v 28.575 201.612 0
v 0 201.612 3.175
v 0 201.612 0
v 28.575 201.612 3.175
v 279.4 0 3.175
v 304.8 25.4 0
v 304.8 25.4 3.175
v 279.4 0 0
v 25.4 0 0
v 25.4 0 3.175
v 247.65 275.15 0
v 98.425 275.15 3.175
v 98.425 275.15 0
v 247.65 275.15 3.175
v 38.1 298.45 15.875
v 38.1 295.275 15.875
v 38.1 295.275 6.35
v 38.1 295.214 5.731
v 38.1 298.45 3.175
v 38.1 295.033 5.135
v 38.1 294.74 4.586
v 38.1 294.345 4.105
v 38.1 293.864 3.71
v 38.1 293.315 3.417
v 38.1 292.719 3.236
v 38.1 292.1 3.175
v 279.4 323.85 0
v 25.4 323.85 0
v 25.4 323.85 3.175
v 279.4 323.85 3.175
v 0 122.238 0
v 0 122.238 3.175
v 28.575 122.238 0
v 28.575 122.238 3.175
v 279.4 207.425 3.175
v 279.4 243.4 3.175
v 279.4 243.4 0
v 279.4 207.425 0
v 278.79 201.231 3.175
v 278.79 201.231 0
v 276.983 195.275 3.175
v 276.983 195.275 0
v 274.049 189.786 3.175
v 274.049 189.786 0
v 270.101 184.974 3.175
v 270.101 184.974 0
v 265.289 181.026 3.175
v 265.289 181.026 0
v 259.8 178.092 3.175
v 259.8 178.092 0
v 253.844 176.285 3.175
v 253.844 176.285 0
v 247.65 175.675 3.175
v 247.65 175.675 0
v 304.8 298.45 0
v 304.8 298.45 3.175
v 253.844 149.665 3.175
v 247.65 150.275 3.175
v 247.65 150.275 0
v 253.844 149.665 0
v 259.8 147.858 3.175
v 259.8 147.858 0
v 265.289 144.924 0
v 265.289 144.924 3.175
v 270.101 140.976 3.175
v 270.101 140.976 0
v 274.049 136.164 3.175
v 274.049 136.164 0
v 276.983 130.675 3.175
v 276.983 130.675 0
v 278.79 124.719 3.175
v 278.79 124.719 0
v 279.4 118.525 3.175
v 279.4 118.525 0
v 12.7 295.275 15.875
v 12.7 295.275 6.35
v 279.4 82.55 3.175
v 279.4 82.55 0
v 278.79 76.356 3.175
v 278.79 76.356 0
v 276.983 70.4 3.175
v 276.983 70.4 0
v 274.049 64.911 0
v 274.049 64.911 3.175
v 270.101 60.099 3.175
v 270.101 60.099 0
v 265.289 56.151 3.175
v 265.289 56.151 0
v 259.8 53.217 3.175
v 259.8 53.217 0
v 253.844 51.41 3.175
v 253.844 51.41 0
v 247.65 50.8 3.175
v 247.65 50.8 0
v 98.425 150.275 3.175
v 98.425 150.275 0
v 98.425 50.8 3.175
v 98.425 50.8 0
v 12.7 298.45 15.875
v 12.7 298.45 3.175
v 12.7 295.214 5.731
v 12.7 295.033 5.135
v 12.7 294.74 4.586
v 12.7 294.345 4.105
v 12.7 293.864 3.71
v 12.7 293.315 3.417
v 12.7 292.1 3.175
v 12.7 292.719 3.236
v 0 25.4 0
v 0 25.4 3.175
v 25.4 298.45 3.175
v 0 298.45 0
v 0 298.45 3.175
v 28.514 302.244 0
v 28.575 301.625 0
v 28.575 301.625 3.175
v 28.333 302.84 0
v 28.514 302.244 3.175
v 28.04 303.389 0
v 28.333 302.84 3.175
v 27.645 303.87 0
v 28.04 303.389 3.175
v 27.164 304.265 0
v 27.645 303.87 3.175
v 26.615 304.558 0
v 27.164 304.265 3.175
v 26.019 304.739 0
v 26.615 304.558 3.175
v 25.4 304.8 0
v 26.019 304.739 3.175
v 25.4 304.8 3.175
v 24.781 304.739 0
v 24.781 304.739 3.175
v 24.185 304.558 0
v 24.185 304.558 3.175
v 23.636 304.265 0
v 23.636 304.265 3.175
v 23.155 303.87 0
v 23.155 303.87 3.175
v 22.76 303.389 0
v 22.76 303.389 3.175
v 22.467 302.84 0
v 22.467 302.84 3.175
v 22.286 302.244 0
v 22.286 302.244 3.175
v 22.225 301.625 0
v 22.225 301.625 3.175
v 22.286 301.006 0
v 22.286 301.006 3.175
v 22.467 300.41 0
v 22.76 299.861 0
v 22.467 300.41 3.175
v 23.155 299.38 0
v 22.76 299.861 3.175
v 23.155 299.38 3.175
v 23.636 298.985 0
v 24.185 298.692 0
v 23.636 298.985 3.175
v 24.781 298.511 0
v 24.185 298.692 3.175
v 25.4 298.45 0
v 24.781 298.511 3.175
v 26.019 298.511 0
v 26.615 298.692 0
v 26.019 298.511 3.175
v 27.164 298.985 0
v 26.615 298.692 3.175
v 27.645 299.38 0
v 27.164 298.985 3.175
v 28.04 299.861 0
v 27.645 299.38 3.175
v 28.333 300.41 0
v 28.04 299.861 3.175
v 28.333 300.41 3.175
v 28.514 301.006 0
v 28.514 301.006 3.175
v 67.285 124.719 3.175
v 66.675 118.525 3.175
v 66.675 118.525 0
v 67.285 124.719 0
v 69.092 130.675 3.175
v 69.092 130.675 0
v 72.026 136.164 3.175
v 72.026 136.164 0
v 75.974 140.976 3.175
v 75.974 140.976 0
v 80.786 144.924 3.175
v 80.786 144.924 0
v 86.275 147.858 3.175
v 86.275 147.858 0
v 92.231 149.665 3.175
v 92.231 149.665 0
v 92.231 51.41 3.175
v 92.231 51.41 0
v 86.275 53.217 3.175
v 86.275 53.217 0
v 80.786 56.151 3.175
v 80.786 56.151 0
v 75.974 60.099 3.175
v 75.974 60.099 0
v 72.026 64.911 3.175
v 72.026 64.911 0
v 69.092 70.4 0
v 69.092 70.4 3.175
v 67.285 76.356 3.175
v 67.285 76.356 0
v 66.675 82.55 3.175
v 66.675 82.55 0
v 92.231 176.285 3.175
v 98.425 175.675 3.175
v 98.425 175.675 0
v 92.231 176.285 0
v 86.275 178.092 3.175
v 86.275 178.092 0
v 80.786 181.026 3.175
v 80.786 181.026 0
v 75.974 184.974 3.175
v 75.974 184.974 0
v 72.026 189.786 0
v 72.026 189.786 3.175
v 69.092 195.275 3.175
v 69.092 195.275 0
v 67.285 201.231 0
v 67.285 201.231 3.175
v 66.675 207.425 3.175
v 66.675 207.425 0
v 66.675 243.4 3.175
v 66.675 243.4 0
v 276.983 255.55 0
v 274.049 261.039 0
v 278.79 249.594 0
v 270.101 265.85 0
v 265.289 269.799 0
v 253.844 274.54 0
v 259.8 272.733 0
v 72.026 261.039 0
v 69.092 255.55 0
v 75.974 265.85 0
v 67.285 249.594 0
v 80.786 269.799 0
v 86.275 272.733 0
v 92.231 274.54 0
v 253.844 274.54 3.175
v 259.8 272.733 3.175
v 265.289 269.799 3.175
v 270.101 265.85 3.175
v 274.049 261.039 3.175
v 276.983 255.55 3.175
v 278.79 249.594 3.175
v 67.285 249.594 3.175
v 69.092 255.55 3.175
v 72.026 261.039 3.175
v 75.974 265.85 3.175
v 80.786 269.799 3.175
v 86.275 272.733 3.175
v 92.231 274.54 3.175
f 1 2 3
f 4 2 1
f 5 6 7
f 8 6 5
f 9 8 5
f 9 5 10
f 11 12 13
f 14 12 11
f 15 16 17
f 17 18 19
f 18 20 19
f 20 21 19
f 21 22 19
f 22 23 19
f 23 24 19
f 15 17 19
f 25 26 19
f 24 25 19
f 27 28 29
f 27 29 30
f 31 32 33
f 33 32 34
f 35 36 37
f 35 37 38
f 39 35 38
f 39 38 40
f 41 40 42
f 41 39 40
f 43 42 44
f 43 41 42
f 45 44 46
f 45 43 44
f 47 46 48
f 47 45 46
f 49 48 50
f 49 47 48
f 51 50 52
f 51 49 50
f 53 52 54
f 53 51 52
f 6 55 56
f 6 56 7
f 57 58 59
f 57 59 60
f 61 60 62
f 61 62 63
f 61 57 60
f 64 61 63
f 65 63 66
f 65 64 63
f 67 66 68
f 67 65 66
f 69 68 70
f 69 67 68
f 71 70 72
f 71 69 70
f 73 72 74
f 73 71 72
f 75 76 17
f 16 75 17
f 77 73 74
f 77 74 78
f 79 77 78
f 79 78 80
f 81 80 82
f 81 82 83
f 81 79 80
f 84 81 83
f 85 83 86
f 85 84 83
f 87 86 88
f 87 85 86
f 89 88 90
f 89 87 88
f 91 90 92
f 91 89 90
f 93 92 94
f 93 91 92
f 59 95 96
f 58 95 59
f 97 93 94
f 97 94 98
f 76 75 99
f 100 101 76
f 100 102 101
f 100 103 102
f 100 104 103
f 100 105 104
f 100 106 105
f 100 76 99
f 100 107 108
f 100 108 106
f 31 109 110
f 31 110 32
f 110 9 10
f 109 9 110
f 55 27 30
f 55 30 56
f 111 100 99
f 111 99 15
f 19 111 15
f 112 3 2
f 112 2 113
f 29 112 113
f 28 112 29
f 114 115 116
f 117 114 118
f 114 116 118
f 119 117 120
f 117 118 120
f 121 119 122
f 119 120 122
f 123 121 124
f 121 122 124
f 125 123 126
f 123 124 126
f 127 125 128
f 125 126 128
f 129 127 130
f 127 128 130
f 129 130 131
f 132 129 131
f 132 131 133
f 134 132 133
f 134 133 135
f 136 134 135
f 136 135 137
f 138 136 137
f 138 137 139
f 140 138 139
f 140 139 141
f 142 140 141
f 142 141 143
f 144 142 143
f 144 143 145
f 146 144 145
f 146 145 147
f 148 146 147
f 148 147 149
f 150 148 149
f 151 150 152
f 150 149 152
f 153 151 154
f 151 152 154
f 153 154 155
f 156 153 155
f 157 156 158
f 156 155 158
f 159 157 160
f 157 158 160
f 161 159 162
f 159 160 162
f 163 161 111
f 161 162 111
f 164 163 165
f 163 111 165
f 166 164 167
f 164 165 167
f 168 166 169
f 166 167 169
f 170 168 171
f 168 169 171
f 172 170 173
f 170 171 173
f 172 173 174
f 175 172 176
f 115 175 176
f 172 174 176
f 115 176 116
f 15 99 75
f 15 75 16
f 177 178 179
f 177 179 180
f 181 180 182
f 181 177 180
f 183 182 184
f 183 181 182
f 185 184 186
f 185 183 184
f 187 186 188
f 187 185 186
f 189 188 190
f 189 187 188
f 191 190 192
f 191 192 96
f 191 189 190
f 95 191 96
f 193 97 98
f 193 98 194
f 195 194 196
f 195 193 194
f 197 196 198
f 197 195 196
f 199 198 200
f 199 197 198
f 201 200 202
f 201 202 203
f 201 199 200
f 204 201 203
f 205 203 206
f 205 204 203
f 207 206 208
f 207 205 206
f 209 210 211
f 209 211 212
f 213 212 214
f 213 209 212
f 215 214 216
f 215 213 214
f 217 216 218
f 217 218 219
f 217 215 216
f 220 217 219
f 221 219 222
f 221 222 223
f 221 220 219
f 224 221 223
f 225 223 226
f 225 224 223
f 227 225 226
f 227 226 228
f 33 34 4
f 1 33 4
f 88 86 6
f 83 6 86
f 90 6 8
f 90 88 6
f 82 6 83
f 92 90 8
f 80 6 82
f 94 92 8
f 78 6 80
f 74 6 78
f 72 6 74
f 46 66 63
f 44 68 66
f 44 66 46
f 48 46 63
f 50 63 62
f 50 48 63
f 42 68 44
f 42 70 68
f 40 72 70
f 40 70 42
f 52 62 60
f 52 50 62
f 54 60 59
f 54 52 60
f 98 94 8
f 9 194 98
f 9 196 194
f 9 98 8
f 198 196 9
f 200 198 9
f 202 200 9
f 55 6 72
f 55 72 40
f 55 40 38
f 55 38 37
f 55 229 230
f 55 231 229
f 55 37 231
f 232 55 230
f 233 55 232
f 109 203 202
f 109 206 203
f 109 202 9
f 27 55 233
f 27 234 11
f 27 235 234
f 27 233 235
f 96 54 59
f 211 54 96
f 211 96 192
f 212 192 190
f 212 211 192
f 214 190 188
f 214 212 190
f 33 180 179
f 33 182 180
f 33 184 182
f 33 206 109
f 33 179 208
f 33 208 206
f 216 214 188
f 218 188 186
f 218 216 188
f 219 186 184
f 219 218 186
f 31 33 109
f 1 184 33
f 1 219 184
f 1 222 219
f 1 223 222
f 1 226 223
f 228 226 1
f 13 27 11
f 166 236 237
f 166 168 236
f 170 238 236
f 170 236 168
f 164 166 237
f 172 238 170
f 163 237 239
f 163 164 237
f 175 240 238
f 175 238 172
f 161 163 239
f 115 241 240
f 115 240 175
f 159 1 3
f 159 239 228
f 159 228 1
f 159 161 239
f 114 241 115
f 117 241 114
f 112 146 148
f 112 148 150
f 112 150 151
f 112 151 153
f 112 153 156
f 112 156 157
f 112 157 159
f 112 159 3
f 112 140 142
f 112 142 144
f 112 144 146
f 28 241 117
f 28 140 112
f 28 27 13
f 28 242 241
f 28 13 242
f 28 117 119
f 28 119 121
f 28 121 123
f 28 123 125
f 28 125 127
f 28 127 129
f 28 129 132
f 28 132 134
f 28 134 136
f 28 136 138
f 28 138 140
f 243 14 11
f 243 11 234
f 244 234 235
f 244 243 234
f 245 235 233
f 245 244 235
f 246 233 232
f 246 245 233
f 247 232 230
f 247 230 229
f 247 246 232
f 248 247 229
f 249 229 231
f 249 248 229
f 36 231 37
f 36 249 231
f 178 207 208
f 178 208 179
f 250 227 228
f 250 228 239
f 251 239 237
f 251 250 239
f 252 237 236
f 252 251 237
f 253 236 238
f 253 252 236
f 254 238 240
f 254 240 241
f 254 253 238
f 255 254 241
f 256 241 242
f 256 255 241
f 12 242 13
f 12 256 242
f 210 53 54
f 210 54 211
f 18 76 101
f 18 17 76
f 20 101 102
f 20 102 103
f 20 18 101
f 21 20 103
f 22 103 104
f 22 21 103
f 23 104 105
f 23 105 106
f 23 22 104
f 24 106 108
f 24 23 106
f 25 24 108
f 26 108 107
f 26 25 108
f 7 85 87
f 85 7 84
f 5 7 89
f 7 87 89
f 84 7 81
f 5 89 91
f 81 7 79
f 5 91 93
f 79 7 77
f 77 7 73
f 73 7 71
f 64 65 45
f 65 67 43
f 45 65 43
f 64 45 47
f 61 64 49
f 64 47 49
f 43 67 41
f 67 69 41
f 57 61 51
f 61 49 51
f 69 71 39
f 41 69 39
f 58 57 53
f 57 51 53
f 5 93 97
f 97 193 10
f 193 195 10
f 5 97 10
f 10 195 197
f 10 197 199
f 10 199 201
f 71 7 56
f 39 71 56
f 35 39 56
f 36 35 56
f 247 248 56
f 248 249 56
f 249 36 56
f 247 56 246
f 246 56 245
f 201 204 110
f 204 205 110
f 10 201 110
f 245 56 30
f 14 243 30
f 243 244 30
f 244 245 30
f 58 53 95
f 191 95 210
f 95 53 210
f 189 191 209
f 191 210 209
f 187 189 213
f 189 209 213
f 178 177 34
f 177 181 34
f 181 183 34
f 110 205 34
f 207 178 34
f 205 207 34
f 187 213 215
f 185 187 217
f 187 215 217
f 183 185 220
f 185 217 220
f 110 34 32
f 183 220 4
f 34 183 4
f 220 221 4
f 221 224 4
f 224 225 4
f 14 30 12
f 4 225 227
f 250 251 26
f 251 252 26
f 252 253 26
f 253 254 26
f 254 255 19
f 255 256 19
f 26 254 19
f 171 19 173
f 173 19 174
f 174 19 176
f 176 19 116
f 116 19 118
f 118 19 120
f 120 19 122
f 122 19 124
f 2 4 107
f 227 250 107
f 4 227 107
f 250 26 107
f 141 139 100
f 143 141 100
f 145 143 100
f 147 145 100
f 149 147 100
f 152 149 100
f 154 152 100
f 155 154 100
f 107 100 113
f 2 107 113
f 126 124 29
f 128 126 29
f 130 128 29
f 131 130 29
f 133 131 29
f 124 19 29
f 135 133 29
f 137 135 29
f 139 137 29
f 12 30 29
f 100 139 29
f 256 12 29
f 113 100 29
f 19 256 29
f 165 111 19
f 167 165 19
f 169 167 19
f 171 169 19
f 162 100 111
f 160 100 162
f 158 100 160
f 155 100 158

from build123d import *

# Parameters (mm, degrees)
BOSS_EXTRUDE2_DEPTH = 3.175
SKETCH4_W           = 28.575
SKETCH4_H           = 79.375
CUT_EXTRUDE2_DEPTH  = 3.175
CUT_EXTRUDE3_DEPTH  = 3.175
SKETCH9_R           = 3.175
CUT_EXTRUDE4_DEPTH  = 3.175
SKETCH11_W          = 25.4
SKETCH11_H          = 3.175
BOSS_EXTRUDE3_DEPTH = 12.7
FILLET2_R           = 3.175


with BuildPart() as part:
    # Sketch1 → Boss-Extrude2 (new body)
    with BuildSketch(Plane.XY):
        Polygon((0, 298.45), (25.4, 323.85), (279.4, 323.85), (304.8, 298.45), (304.8, 25.4), (279.4, 0), (25.4, 0), (0, 25.4), align=None)
    extrude(amount=BOSS_EXTRUDE2_DEPTH)

    # Sketch4 → Cut-Extrude2 (cut)
    with BuildSketch(Plane.XY.offset(3.175)):
        with Locations((14.2875, 161.925)):
            Rectangle(SKETCH4_W, SKETCH4_H)
    extrude(amount=-CUT_EXTRUDE2_DEPTH, mode=Mode.SUBTRACT)

    # Sketch5 → Cut-Extrude3 (cut)
    with BuildSketch(Plane.XY.offset(3.175)):
        with BuildLine():
            Line((98.425, 275.149783319), (247.65, 275.149783319))
            ThreePointArc((247.65, 275.149783319), (270.100640303, 265.850423621), (279.4, 243.399783319))
            Line((279.4, 243.399783319), (279.4, 207.424891659))
            ThreePointArc((279.4, 207.424891659), (270.100640303, 184.974251357), (247.65, 175.674891659))
            Line((247.65, 175.674891659), (98.425, 175.674891659))
            ThreePointArc((98.425, 175.674891659), (75.974359697, 184.974251357), (66.675, 207.424891659))
            Line((66.675, 207.424891659), (66.675, 243.399783319))
            ThreePointArc((66.675, 243.399783319), (75.974359697, 265.850423621), (98.425, 275.149783319))
        make_face()
        with BuildLine():
            Line((98.425, 150.274891659), (247.65, 150.274891659))
            ThreePointArc((247.65, 150.274891659), (270.100640303, 140.975531962), (279.4, 118.524891659))
            Line((279.4, 118.524891659), (279.4, 82.55))
            ThreePointArc((279.4, 82.55), (270.100640303, 60.099359697), (247.65, 50.8))
            Line((247.65, 50.8), (98.425, 50.8))
            ThreePointArc((98.425, 50.8), (75.974359697, 60.099359697), (66.675, 82.55))
            Line((66.675, 82.55), (66.675, 118.524891659))
            ThreePointArc((66.675, 118.524891659), (75.974359697, 140.975531962), (98.425, 150.274891659))
        make_face()
    extrude(amount=-CUT_EXTRUDE3_DEPTH, mode=Mode.SUBTRACT)

    # Sketch9 → Cut-Extrude4 (cut)
    with BuildSketch(Plane.XY.offset(3.175)):
        with Locations((25.4, 301.625)):
            Circle(SKETCH9_R)
    extrude(amount=-CUT_EXTRUDE4_DEPTH, mode=Mode.SUBTRACT)

    # Sketch11 → Boss-Extrude3 (add)
    with BuildSketch(Plane.XY.offset(3.175)):
        with Locations((25.4, 296.8625)):
            Rectangle(SKETCH11_W, SKETCH11_H)
    extrude(amount=BOSS_EXTRUDE3_DEPTH)

    # Fillet2
    fillet2_edges = [part.edges().sort_by_distance(p)[0] for p in [
        (25.4, 295.275, 3.175),
    ]]
    fillet(fillet2_edges, radius=FILLET2_R)


solid = part.part
